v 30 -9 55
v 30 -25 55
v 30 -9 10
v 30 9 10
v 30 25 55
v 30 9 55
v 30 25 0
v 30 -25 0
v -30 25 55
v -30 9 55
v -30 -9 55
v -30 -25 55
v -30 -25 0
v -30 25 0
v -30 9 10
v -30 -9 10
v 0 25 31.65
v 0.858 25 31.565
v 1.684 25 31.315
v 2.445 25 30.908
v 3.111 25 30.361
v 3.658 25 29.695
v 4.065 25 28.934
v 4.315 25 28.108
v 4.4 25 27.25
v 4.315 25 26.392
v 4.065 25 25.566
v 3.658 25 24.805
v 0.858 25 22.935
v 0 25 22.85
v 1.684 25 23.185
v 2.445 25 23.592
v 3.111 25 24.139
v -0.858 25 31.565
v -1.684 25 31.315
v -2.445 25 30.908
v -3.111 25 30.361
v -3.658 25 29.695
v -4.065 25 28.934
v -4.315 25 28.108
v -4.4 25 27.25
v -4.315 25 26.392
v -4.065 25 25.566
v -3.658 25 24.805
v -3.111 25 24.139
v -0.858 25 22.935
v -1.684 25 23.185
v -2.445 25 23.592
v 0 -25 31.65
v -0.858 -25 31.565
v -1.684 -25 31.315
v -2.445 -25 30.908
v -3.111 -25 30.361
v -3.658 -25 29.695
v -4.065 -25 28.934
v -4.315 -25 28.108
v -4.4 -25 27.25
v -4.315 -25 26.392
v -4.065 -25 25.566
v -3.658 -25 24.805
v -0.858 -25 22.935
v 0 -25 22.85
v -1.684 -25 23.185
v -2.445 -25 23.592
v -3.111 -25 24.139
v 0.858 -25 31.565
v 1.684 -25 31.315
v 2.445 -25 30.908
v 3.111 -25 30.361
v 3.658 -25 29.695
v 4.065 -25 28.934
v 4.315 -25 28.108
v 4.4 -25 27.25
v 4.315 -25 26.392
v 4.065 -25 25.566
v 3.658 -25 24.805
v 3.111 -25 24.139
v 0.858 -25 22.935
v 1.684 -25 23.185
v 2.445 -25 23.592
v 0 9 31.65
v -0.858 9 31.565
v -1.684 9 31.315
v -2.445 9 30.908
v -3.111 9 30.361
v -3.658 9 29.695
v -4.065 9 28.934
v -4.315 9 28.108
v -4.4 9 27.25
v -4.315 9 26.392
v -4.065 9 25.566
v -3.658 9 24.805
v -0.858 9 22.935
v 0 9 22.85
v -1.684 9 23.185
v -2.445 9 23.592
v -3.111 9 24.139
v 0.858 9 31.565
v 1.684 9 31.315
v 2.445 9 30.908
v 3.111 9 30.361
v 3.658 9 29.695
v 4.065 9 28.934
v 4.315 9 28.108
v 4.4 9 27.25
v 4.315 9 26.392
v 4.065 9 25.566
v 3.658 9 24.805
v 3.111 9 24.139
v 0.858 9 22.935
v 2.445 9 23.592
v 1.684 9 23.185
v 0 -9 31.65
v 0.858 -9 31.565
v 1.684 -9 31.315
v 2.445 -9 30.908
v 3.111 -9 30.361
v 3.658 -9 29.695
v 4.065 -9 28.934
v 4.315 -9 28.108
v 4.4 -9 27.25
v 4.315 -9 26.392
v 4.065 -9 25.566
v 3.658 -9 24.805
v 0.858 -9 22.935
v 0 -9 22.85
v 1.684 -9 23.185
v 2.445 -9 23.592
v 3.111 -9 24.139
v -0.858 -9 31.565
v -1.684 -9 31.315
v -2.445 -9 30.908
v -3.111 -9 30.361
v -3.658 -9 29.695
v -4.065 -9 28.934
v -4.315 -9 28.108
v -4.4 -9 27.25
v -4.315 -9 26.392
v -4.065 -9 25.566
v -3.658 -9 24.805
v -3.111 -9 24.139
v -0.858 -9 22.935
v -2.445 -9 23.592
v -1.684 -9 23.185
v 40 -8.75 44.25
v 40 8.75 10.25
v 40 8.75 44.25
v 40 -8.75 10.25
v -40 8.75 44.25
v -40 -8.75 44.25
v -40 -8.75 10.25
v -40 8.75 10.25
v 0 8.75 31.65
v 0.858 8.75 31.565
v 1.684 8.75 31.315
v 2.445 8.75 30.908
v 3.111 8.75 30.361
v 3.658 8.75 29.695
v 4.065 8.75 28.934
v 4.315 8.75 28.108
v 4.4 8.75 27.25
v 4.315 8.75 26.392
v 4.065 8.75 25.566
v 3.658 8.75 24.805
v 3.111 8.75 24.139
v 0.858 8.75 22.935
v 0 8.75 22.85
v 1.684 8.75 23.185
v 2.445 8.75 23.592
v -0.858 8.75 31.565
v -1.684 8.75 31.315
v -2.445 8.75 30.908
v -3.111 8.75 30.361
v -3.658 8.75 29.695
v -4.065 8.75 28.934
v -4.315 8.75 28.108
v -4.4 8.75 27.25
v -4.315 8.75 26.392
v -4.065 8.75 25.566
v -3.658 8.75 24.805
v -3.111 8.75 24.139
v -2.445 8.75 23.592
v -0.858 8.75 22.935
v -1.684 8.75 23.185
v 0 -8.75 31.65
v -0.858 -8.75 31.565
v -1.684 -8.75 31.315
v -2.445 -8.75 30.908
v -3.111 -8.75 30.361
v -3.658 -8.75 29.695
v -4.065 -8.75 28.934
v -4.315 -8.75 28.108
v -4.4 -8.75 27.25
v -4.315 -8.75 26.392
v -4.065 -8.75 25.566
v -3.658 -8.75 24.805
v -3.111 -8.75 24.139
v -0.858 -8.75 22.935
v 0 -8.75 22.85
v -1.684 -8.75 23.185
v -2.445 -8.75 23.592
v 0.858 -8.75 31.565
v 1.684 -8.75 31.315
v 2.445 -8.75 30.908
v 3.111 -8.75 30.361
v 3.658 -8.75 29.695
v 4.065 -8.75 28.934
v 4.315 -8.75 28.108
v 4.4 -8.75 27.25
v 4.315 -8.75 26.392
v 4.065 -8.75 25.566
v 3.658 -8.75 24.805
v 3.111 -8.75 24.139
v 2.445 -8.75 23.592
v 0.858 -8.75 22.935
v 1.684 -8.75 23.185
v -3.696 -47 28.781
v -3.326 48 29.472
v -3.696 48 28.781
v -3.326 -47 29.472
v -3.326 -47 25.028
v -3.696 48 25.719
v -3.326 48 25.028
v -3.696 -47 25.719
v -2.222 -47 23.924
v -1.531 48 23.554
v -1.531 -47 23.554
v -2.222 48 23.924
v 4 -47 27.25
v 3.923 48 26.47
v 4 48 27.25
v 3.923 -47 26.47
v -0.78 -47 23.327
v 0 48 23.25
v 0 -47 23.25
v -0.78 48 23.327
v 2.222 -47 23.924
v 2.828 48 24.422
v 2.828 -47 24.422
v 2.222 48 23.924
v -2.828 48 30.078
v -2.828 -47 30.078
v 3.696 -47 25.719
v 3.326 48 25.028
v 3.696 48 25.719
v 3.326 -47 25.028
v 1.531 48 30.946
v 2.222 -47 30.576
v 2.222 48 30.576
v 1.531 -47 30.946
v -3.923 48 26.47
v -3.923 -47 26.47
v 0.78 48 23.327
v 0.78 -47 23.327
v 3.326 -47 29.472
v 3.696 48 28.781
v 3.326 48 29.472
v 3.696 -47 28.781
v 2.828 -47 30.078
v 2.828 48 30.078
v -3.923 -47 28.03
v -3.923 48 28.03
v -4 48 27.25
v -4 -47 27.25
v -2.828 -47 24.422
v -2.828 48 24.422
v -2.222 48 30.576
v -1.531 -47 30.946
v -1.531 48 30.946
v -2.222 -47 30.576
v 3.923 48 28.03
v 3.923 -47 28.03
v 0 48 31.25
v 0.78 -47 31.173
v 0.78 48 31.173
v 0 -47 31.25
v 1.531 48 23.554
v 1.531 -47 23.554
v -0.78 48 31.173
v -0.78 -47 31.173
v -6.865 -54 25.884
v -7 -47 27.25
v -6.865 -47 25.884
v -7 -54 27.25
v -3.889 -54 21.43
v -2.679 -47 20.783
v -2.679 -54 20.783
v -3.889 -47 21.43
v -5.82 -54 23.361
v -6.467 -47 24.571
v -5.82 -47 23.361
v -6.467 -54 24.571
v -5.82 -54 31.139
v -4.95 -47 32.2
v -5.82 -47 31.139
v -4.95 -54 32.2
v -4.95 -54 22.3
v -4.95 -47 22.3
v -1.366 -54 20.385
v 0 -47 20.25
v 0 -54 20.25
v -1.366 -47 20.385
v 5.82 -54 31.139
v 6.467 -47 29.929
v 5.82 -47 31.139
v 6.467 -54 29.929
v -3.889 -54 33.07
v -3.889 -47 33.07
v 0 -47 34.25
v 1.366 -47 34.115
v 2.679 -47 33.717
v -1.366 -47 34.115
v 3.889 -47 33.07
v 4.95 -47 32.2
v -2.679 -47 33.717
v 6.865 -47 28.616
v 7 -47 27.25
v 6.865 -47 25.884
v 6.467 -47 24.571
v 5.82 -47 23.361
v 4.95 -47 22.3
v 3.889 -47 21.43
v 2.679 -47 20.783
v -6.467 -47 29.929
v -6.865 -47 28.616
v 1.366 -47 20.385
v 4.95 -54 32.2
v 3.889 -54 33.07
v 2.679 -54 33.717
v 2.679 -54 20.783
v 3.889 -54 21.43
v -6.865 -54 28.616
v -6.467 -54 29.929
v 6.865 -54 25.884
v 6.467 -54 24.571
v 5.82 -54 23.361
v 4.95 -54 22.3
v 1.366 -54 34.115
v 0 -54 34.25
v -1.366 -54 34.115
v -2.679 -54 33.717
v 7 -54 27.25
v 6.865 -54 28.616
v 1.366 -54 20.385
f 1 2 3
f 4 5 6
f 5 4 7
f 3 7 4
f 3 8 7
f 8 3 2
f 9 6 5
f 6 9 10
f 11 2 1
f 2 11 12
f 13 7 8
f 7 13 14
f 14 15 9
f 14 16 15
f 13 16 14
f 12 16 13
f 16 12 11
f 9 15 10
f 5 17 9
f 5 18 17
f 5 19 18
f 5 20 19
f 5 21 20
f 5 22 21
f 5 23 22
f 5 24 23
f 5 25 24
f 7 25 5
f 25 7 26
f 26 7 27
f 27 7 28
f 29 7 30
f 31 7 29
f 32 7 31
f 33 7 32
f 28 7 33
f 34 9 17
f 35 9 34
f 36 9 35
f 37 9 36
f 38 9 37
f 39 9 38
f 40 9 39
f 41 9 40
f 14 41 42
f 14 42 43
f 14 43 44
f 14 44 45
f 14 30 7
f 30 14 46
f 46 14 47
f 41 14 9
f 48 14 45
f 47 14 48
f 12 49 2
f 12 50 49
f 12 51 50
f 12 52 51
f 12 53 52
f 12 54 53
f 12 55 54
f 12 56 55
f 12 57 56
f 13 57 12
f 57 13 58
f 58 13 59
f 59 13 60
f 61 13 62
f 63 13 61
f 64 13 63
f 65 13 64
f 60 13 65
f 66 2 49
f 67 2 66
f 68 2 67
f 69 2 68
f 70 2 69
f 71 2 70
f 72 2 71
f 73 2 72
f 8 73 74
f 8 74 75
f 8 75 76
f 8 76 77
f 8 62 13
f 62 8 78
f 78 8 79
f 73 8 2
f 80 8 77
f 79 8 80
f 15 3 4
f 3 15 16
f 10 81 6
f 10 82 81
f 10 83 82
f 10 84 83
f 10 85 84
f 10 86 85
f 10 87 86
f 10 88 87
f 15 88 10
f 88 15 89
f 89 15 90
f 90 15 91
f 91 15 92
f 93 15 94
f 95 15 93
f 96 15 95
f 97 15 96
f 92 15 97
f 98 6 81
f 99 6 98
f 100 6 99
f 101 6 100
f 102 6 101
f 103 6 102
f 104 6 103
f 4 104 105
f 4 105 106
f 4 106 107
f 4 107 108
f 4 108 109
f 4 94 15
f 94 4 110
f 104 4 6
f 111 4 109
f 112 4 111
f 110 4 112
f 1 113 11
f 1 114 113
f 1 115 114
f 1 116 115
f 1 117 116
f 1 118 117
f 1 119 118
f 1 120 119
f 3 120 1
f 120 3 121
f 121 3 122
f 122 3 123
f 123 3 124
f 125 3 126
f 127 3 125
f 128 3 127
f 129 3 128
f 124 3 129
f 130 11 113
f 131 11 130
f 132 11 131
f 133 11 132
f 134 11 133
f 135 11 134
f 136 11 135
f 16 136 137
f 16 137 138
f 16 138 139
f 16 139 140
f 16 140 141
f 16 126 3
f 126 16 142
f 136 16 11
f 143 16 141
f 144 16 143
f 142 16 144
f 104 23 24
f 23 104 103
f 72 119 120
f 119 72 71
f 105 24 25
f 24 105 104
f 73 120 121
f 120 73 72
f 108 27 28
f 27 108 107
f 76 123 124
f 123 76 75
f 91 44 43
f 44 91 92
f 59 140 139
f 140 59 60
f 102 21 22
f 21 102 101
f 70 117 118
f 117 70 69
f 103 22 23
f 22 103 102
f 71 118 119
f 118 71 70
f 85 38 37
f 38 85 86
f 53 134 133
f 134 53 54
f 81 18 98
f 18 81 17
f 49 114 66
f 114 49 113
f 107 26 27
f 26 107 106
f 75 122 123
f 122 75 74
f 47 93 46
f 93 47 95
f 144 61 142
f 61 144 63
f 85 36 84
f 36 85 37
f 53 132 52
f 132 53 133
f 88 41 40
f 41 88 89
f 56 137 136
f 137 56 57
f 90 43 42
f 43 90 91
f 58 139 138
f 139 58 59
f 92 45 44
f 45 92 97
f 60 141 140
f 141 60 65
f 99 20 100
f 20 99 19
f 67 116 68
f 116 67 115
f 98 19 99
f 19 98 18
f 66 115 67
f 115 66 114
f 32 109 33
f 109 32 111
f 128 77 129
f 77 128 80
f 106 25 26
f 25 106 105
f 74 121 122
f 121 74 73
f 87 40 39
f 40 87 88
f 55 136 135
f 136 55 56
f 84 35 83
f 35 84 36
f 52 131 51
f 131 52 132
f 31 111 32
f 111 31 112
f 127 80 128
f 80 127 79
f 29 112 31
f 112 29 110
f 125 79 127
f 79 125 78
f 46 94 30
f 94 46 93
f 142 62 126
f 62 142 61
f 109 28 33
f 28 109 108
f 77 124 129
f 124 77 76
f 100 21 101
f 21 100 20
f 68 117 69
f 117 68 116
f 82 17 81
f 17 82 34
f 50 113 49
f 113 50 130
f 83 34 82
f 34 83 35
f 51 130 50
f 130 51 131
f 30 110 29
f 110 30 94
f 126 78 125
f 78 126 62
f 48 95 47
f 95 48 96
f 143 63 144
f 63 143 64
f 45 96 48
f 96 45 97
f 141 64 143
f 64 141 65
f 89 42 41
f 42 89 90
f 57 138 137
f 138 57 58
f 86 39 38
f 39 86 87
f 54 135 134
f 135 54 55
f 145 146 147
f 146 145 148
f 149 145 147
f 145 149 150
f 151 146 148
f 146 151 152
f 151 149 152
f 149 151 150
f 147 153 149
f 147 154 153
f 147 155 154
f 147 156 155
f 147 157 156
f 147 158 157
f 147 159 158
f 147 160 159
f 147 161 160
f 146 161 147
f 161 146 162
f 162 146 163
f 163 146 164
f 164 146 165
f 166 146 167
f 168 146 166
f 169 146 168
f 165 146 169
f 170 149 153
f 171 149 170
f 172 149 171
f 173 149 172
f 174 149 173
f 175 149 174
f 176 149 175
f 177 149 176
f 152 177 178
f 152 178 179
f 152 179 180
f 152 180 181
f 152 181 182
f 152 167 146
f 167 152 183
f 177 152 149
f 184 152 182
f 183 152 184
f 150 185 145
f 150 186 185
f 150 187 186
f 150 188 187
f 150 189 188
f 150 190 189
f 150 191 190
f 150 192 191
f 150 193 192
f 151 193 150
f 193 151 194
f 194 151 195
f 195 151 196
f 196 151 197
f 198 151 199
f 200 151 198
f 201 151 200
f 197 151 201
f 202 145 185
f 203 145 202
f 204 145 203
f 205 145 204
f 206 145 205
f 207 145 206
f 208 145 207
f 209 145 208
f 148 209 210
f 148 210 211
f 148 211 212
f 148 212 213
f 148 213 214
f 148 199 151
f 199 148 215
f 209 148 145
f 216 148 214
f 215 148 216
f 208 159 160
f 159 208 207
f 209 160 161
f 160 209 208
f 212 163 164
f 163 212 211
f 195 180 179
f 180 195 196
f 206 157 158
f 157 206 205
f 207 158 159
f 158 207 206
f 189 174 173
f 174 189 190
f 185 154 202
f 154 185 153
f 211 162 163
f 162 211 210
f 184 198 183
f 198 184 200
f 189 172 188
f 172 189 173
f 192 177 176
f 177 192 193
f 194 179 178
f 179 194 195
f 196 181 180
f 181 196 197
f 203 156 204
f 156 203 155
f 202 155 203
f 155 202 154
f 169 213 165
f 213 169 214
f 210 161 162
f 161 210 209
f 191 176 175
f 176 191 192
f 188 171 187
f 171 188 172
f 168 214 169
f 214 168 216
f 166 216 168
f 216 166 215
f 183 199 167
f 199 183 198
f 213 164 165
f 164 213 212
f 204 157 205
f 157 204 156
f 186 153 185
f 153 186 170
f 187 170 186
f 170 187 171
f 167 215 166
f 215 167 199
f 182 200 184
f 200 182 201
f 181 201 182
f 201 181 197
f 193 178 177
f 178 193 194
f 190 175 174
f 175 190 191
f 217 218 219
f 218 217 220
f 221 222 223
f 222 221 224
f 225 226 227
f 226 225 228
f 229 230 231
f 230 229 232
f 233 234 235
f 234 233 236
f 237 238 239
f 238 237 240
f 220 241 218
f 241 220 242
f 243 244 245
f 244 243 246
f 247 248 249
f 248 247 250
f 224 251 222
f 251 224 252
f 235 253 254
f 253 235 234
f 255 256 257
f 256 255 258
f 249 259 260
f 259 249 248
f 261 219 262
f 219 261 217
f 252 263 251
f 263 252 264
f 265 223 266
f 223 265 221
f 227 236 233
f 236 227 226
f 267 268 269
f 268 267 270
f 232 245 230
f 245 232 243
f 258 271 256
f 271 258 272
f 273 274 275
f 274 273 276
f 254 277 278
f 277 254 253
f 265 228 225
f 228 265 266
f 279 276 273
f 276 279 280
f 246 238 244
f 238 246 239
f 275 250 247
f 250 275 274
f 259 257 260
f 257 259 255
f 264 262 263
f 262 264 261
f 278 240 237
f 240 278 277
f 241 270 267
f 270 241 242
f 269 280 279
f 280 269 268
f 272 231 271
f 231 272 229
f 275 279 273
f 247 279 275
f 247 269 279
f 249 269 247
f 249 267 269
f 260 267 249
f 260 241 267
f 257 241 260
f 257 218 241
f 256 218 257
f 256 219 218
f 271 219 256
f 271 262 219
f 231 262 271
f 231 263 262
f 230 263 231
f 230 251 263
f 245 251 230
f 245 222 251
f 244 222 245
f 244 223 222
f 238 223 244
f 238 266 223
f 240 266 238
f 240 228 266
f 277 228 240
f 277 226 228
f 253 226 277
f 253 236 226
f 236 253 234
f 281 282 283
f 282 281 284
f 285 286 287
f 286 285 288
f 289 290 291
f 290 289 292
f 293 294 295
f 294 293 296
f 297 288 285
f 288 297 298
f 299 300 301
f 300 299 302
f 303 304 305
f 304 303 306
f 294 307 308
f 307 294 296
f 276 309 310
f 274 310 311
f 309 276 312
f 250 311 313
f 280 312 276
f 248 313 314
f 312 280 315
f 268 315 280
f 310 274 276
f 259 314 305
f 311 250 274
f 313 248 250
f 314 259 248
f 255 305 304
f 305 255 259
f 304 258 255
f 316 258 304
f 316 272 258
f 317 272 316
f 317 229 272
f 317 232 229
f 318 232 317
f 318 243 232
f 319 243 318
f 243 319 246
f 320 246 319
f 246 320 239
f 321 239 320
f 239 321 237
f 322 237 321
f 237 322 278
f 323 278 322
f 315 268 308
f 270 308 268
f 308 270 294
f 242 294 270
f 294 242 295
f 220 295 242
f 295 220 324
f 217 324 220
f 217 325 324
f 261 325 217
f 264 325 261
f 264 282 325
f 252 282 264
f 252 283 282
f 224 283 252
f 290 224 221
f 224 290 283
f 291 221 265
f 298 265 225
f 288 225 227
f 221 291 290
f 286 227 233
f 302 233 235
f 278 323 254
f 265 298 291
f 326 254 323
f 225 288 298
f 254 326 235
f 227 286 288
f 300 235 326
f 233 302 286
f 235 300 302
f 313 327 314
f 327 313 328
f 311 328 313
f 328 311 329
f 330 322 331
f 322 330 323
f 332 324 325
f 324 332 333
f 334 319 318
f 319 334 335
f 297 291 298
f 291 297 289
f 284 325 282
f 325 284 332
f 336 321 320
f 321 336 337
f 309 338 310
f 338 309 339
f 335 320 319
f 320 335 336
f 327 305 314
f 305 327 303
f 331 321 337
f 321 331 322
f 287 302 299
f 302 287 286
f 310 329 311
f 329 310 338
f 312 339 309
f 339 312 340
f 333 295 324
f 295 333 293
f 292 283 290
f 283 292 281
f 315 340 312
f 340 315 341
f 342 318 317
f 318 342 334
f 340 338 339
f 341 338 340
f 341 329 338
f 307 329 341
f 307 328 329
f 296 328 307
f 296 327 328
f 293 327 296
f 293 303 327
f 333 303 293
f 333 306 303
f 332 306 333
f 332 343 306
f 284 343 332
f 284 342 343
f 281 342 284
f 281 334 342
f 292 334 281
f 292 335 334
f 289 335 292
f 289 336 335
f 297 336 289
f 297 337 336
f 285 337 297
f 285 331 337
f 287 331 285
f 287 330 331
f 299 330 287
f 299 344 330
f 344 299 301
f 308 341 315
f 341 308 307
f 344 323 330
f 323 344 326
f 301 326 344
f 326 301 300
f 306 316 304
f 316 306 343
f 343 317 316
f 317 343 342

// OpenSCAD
$fn = 32;

// ------------------------------------------------------------------------
// Clevis joint: 60 mm clevis, pin d8
// Every part is its own module, assembly() places them once.
// ------------------------------------------------------------------------

// --- part 1 ---
module clevis() {
  difference() {
    translate([-30, -25, 0]) cube([60, 50, 55]);
    translate([-31, -9, 10]) cube([62, 18, 46]);
    translate([0, 0, 27.25]) rotate([90, 0, 0]) cylinder(h = 52, d = 8.8, center = true);
  }
}

// --- part 2 ---
module eye() {
  difference() {
    translate([-40, -8.75, 0]) cube([80, 17.5, 34]);
    translate([0, 0, 17]) rotate([90, 0, 0]) cylinder(h = 19.5, d = 8.8, center = true);
  }
}

// --- part 3 ---
module pin() {
  rotate([0, 90, 0]) cylinder(h = 96, d = 8, center = true);
  translate([-54, 0, 0]) rotate([0, 90, 0]) cylinder(h = 7, d = 14);
}

// --- assembly ---
module assembly() {
  translate([0, 0, 0]) rotate([0, 0, 0]) clevis();
  translate([0, 0, 10.25]) rotate([0, 0, 0]) eye();
  translate([0, 0, 27.25]) rotate([0, 0, 90]) pin();
}

assembly();
